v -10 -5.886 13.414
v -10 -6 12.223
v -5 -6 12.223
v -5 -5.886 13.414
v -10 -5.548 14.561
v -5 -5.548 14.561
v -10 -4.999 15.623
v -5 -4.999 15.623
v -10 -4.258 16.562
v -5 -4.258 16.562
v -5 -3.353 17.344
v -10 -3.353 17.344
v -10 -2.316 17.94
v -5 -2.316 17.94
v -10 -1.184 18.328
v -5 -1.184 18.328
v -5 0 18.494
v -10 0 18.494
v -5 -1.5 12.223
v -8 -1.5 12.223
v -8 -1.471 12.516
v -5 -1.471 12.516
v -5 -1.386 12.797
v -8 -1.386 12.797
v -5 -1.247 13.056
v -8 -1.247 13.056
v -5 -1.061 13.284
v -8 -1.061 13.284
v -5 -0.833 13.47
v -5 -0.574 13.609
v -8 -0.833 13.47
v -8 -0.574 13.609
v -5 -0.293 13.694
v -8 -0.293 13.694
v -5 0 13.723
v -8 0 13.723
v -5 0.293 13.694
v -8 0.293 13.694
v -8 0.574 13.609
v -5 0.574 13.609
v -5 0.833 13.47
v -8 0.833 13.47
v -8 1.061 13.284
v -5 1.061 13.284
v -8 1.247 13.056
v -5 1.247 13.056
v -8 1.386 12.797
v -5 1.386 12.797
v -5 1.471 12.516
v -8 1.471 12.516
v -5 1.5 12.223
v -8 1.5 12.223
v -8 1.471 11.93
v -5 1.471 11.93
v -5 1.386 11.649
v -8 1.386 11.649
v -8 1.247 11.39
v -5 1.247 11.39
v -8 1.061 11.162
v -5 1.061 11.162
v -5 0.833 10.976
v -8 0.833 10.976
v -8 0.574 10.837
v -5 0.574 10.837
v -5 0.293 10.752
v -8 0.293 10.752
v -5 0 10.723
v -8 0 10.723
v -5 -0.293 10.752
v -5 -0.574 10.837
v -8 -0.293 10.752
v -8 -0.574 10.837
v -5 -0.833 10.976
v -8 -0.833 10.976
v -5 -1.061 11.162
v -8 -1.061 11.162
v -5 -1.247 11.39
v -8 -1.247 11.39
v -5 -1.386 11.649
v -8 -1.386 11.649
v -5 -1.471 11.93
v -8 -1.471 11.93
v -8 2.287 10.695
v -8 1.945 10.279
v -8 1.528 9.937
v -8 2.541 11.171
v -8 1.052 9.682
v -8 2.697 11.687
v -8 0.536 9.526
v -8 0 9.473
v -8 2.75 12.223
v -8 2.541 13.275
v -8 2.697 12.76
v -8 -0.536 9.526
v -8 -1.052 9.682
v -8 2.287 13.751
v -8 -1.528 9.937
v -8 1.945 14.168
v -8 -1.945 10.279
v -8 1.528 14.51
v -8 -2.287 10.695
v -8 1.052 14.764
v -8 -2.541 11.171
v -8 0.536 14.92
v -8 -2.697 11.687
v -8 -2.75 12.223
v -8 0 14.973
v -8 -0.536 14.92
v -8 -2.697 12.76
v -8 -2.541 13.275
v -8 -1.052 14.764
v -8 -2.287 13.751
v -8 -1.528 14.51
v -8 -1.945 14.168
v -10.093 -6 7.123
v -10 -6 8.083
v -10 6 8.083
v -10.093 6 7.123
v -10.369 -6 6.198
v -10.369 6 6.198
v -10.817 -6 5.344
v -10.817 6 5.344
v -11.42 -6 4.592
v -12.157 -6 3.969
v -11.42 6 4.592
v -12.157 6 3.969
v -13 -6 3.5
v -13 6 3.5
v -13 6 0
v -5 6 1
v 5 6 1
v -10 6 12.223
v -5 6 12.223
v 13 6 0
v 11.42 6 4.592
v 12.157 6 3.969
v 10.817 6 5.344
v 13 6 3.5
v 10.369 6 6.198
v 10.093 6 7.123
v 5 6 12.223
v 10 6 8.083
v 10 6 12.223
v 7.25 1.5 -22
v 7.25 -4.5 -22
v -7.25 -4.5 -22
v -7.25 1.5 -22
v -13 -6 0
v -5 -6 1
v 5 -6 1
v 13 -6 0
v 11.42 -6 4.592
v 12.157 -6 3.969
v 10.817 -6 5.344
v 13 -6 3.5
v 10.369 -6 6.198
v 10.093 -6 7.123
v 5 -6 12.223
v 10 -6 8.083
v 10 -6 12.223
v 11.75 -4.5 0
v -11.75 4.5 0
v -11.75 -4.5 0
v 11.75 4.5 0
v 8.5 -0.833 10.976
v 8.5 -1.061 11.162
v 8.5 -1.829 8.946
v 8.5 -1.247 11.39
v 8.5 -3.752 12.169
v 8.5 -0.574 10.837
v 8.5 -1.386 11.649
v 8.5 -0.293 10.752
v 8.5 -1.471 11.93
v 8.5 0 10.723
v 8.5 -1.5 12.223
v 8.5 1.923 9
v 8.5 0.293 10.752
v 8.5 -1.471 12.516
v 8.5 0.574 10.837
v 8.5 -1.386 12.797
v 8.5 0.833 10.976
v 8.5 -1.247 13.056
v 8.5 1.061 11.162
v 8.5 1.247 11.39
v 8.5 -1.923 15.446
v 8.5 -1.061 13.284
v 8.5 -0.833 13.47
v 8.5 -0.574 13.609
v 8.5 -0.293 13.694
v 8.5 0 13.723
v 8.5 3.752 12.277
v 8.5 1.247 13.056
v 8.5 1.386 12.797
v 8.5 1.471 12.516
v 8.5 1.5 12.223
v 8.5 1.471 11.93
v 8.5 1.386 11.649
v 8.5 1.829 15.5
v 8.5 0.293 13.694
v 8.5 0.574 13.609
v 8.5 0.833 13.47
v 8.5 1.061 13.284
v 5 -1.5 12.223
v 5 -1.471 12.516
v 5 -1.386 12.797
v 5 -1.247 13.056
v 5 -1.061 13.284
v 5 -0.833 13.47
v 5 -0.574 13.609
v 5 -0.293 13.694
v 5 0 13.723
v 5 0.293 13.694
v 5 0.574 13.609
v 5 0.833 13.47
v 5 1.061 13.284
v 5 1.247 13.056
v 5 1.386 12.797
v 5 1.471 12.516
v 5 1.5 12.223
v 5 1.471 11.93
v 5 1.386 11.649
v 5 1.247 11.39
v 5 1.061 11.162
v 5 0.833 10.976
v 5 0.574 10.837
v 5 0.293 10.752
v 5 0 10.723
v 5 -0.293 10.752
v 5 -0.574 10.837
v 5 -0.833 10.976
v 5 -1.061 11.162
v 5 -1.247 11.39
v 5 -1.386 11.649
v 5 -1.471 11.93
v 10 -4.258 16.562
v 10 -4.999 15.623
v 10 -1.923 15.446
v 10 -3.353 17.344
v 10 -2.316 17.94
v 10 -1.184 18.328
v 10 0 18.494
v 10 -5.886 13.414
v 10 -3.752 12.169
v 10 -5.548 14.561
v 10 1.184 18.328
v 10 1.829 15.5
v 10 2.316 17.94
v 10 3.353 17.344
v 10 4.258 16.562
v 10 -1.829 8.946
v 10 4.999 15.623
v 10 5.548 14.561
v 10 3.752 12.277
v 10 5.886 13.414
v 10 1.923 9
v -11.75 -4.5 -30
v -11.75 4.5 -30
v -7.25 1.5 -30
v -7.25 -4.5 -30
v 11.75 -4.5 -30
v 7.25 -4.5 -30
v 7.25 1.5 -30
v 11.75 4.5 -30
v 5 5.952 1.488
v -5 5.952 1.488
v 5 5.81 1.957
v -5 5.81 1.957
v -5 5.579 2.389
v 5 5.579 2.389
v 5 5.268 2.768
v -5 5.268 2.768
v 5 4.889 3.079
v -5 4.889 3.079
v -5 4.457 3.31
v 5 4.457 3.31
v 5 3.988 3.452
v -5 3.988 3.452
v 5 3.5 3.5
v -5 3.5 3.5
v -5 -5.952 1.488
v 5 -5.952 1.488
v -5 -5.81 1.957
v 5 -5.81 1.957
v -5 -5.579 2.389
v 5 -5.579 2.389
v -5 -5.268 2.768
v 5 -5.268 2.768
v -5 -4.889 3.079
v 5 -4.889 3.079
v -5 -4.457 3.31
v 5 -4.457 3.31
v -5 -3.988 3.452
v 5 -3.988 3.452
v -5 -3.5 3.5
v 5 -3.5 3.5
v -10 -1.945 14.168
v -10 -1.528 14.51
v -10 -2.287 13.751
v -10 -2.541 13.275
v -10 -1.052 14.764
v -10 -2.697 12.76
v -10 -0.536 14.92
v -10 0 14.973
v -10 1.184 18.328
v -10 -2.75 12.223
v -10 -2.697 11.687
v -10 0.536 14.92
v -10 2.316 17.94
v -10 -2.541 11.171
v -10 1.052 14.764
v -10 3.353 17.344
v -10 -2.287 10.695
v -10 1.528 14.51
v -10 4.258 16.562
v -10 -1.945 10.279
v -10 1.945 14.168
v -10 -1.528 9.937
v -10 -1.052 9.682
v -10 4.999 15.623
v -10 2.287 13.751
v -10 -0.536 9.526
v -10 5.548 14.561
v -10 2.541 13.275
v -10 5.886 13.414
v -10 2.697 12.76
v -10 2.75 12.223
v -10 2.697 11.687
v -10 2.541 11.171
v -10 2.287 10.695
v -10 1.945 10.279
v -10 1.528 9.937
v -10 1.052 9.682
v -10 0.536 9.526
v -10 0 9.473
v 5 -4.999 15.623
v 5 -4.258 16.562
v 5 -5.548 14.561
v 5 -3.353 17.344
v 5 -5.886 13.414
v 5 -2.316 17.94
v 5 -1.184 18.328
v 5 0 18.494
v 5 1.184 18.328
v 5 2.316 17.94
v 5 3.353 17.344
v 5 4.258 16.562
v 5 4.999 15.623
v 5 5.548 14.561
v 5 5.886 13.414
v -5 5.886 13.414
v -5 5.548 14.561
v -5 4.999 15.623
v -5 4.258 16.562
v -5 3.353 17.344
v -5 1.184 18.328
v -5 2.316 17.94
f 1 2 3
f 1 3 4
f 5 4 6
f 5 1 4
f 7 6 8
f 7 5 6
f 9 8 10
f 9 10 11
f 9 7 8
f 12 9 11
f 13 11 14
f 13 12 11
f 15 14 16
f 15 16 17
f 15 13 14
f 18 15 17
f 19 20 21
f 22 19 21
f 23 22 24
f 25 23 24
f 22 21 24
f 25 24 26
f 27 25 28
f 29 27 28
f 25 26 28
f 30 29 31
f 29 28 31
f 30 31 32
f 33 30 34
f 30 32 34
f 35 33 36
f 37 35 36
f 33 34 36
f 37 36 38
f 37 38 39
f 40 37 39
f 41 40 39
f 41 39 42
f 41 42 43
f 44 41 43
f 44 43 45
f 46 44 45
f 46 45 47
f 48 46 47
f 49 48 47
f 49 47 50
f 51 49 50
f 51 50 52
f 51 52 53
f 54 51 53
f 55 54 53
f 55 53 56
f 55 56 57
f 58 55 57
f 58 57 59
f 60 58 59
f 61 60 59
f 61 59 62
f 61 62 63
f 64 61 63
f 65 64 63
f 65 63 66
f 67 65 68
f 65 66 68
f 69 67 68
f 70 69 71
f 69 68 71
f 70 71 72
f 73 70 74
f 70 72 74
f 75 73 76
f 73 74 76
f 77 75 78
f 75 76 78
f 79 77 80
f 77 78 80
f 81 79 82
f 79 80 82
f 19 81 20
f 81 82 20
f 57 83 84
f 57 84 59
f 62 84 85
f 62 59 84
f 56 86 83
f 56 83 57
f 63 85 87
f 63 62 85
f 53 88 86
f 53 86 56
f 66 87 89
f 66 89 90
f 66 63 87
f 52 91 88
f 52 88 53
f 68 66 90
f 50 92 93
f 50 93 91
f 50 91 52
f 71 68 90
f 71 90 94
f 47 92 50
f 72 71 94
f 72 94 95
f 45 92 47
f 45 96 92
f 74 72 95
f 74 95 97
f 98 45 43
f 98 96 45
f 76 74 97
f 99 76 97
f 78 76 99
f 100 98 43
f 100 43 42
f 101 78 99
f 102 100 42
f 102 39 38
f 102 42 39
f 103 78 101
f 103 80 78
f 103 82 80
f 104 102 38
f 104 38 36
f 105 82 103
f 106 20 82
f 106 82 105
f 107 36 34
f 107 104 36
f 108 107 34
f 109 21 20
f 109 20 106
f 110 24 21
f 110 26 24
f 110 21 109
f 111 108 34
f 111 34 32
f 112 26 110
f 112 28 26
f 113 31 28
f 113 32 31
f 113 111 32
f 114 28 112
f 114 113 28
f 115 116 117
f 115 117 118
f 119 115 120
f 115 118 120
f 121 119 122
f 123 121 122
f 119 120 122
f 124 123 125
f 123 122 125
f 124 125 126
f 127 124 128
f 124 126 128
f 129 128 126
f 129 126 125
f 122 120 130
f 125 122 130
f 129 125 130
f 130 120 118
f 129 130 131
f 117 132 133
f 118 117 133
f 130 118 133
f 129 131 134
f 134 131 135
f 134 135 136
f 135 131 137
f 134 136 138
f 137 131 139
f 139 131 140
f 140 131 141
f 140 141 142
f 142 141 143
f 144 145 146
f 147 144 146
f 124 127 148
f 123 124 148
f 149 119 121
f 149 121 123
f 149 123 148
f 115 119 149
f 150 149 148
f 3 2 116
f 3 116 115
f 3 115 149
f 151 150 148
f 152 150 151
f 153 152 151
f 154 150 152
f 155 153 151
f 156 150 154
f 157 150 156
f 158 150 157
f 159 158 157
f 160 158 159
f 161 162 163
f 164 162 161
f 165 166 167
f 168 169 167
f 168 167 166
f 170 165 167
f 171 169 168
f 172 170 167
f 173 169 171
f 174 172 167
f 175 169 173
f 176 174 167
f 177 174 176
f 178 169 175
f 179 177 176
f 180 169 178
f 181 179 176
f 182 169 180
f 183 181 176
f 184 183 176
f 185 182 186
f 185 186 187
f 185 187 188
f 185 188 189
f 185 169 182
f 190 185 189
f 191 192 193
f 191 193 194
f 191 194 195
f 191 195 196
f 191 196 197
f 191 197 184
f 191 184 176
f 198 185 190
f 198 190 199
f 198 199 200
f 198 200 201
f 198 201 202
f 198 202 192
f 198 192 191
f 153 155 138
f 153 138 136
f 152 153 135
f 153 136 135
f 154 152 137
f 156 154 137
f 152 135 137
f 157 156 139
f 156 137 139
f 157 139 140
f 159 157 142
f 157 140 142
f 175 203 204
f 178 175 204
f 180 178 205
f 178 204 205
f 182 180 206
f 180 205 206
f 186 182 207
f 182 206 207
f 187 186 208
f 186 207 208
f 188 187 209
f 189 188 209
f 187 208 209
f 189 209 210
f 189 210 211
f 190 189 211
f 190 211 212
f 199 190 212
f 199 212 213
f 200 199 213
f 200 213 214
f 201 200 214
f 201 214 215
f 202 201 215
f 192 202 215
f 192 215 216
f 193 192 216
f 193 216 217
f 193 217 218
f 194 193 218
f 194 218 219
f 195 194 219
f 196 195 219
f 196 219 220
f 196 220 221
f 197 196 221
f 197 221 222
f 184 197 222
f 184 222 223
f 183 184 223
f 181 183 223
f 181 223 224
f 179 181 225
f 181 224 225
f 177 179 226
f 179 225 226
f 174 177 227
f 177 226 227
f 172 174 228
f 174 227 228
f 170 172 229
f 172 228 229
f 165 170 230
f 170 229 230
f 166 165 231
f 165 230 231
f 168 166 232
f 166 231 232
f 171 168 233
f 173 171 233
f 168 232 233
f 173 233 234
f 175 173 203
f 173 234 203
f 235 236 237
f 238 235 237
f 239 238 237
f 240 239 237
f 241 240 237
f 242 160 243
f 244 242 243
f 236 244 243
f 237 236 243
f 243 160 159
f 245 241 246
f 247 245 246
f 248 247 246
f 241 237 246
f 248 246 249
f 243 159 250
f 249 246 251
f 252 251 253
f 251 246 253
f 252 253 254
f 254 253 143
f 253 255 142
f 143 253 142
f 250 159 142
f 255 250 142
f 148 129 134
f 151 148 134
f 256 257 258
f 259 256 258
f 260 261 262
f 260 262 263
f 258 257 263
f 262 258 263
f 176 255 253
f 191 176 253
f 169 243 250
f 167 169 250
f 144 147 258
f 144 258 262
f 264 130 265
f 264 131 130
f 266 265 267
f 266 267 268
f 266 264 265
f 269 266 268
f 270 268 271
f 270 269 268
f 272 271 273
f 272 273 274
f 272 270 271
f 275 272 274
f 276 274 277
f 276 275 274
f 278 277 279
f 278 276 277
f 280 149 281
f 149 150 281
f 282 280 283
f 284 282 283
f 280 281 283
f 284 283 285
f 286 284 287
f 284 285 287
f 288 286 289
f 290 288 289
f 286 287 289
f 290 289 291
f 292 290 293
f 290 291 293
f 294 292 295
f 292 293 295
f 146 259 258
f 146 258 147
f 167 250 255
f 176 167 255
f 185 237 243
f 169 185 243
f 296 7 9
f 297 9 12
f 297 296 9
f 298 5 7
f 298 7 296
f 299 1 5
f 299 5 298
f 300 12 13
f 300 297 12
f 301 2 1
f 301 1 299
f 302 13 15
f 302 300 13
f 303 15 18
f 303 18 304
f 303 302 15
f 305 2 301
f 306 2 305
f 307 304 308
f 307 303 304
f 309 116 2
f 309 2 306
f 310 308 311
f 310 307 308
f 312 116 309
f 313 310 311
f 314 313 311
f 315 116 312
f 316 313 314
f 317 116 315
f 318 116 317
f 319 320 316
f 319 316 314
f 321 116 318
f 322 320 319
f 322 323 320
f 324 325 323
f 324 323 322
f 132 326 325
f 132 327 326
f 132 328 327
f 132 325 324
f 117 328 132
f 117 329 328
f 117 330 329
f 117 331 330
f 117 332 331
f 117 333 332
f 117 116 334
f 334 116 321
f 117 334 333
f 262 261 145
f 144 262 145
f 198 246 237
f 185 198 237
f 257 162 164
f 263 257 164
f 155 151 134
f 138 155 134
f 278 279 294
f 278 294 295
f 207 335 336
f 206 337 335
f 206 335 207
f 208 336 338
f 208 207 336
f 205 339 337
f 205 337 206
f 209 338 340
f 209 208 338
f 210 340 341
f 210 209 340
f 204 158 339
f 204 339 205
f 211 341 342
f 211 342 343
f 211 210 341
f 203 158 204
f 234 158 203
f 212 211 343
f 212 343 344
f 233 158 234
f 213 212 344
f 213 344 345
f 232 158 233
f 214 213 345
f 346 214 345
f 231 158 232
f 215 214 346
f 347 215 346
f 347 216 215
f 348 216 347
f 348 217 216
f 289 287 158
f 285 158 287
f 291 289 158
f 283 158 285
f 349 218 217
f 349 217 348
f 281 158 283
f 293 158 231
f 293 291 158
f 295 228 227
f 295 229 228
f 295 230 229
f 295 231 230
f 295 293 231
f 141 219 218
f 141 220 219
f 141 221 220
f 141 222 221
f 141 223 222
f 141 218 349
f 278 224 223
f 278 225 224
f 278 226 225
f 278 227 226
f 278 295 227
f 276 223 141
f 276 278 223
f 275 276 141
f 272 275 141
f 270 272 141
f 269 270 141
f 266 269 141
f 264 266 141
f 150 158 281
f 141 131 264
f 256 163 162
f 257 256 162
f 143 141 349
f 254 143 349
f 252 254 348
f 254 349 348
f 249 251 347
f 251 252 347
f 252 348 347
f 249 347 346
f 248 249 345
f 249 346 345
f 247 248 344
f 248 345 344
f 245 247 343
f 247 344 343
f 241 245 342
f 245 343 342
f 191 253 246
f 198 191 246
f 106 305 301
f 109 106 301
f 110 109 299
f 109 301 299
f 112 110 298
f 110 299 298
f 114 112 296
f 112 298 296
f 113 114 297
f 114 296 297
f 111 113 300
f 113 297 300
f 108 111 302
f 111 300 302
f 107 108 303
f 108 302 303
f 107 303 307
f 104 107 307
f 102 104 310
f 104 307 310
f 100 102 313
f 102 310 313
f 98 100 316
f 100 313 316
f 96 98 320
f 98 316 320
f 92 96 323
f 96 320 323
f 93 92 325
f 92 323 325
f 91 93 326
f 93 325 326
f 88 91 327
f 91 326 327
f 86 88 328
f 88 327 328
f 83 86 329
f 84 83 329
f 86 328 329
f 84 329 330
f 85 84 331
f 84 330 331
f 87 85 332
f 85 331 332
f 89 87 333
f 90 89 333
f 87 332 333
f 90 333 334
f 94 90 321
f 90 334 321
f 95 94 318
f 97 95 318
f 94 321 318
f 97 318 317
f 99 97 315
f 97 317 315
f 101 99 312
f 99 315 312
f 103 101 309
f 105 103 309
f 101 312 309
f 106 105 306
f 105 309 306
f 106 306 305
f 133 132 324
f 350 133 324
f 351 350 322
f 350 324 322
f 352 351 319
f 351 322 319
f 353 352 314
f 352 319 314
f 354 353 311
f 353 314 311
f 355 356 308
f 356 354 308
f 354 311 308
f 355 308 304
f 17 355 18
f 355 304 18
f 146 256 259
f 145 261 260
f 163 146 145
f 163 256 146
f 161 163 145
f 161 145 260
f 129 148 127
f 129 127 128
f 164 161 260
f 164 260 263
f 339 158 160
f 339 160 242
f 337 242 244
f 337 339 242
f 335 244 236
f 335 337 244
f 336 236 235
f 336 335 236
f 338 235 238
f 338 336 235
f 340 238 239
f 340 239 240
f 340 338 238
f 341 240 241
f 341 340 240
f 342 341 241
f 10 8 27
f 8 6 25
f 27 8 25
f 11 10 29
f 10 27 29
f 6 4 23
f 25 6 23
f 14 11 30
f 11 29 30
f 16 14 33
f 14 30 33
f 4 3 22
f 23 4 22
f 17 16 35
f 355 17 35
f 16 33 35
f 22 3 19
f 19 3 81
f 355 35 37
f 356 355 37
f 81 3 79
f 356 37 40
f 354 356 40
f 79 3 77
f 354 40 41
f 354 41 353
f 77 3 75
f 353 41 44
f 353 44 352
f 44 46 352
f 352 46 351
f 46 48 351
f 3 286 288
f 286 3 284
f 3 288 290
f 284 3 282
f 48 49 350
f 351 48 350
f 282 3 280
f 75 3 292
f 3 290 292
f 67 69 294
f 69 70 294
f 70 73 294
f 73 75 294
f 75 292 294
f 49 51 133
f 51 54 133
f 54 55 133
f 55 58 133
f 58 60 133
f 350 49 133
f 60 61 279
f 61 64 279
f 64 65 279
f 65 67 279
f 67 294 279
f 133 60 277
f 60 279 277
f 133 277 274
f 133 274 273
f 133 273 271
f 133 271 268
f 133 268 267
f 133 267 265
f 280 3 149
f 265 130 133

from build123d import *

# Parameters (mm, degrees)
F0_W         = 23.5
F0_H         = 9
F2_DEPTH     = 30
F3_W         = 26
F3_H         = 12
F3_W_2       = 23.5
F3_H_2       = 9
F4_DEPTH     = 3.5
F5_W         = 5
F5_H         = 12
F7_DEPTH     = 15
F8_T1_DEPTH  = 36.3847763109
F8_T3_DEPTH  = 36.3847763109
F12_DEPTH    = 1.5
F9_R         = 1.5
F14_DEPTH    = 25
F15_W        = 7.25
F15_H        = 8
F17_DEPTH    = 6
F18_T1_DEPTH = 12
F19_R        = 2.5
F9_R_2       = 2.75
F20_DEPTH    = 2


# Not quite as in the source:
# - a fillet or chamfer that OpenCascade refuses, or shapes differently, is made with other operations: its cross-section is extruded or revolved along the edge and cut away or added


with BuildPart() as f2:
    # F0 (on Top) → F2 (new body)
    with BuildSketch(Plane.XY):
        Rectangle(F0_W, F0_H)
    extrude(amount=-F2_DEPTH)

    # F15 (on face) → F17 (cut)
    with BuildSketch(Plane.XZ.offset(4.5)):
        with Locations((3.625, -26)):
            Rectangle(F15_W, F15_H)
        with Locations((-3.625, -26)):
            Rectangle(F15_W, F15_H)
    extrude(amount=-F17_DEPTH, mode=Mode.SUBTRACT)


with BuildPart() as f4:
    # F3 (on face) → F4 (new body)
    with BuildSketch(Plane.XY):
        Rectangle(F3_W, F3_H)
        Rectangle(F3_W_2, F3_H_2, mode=Mode.SUBTRACT)
        Rectangle(F3_W_2, F3_H_2)
    extrude(amount=F4_DEPTH)

    # F5 (on face) → F7 (join)
    with BuildSketch(Plane.XY.offset(3.5)):
        with Locations((-7.5, 0)):
            Rectangle(F5_W, F5_H)
        with Locations((7.5, 0)):
            Rectangle(F5_W, F5_H)
    extrude(amount=F7_DEPTH)

    # F8: fillet of radius 6.2769552622 on 4 edges, made by hand

    # F8_s2 → F8_t1 (cut)
    with BuildSketch(Plane.YZ.offset(-25.6923881554)):
        with BuildLine():
            ThreePointArc((-6, 12.2230447378), (-4.1615223689, 16.6615223689), (0.2769552622, 18.5))
            Line((0.2769552622, 18.5), (-6, 18.5))
            Line((-6, 18.5), (-6, 12.2230447378))
        make_face()
        with BuildLine():
            ThreePointArc((6, 12.2230447378), (4.1615223689, 16.6615223689), (-0.2769552622, 18.5))
            Line((-0.2769552622, 18.5), (6, 18.5))
            Line((6, 18.5), (6, 12.2230447378))
        make_face()
    extrude(amount=F8_T1_DEPTH, mode=Mode.SUBTRACT)

    # F8_s4 → F8_t3 (cut)
    with BuildSketch(Plane.YZ.offset(-10.6923881554)):
        with BuildLine():
            ThreePointArc((6, 12.2230447378), (4.1615223689, 16.6615223689), (-0.2769552622, 18.5))
            Line((-0.2769552622, 18.5), (6, 18.5))
            Line((6, 18.5), (6, 12.2230447378))
        make_face()
        with BuildLine():
            ThreePointArc((-6, 12.2230447378), (-4.1615223689, 16.6615223689), (0.2769552622, 18.5))
            Line((0.2769552622, 18.5), (-6, 18.5))
            Line((-6, 18.5), (-6, 12.2230447378))
        make_face()
    extrude(amount=F8_T3_DEPTH, mode=Mode.SUBTRACT)

    # F10 (on face) → F12 (cut)
    with BuildSketch(Plane.YZ.offset(10)):
        Polygon((1.922952101, 9.0003768135), (3.7523883409, 12.2770361454), (1.8294362399, 15.4997040697), (-1.922952101, 15.4457126622), (-3.7523883409, 12.1690533302), (-1.8294362399, 8.9463854059), align=None)
    extrude(amount=-F12_DEPTH, mode=Mode.SUBTRACT)

    # F9 (on face) → F14 (cut)
    with BuildSketch(Plane(origin=(-10, 0, 0), x_dir=(0, -1, 0), z_dir=(-1, 0, 0))):
        with Locations((0, 12.2230447378)):
            Circle(F9_R)
    extrude(amount=-F14_DEPTH, mode=Mode.SUBTRACT)

    # F18: fillet of radius 5 on 2 edges, made by hand

    # F18_s2 → F18_t1 (join)
    with BuildSketch(Plane.XZ.offset(-6)):
        with BuildLine():
            ThreePointArc((13, 3.5), (10.8166998673, 5.3439629074), (10, 8.082575695))
            Line((10, 8.082575695), (10, 3.5))
            Line((10, 3.5), (13, 3.5))
        make_face()
        with BuildLine():
            ThreePointArc((-10, 8.082575695), (-10.8166998673, 5.3439629074), (-13, 3.5))
            Line((-13, 3.5), (-10, 3.5))
            Line((-10, 3.5), (-10, 8.082575695))
        make_face()
    extrude(amount=F18_T1_DEPTH)

    # F19
    f19_edges = [f4.edges().sort_by_distance(p)[0] for p in [
        (0, 6, 3.5),
        (0, -6, 3.5),
    ]]
    fillet(f19_edges, radius=F19_R)

    # F9 (on face) → F20 (cut)
    with BuildSketch(Plane(origin=(-10, 0, 0), x_dir=(0, -1, 0), z_dir=(-1, 0, 0))):
        with Locations((0, 12.2230447378)):
            Circle(F9_R_2)
        with Locations((0, 12.2230447378)):
            Circle(F9_R, mode=Mode.SUBTRACT)
    extrude(amount=-F20_DEPTH, mode=Mode.SUBTRACT)


solid = Compound([f2.part, f4.part])
